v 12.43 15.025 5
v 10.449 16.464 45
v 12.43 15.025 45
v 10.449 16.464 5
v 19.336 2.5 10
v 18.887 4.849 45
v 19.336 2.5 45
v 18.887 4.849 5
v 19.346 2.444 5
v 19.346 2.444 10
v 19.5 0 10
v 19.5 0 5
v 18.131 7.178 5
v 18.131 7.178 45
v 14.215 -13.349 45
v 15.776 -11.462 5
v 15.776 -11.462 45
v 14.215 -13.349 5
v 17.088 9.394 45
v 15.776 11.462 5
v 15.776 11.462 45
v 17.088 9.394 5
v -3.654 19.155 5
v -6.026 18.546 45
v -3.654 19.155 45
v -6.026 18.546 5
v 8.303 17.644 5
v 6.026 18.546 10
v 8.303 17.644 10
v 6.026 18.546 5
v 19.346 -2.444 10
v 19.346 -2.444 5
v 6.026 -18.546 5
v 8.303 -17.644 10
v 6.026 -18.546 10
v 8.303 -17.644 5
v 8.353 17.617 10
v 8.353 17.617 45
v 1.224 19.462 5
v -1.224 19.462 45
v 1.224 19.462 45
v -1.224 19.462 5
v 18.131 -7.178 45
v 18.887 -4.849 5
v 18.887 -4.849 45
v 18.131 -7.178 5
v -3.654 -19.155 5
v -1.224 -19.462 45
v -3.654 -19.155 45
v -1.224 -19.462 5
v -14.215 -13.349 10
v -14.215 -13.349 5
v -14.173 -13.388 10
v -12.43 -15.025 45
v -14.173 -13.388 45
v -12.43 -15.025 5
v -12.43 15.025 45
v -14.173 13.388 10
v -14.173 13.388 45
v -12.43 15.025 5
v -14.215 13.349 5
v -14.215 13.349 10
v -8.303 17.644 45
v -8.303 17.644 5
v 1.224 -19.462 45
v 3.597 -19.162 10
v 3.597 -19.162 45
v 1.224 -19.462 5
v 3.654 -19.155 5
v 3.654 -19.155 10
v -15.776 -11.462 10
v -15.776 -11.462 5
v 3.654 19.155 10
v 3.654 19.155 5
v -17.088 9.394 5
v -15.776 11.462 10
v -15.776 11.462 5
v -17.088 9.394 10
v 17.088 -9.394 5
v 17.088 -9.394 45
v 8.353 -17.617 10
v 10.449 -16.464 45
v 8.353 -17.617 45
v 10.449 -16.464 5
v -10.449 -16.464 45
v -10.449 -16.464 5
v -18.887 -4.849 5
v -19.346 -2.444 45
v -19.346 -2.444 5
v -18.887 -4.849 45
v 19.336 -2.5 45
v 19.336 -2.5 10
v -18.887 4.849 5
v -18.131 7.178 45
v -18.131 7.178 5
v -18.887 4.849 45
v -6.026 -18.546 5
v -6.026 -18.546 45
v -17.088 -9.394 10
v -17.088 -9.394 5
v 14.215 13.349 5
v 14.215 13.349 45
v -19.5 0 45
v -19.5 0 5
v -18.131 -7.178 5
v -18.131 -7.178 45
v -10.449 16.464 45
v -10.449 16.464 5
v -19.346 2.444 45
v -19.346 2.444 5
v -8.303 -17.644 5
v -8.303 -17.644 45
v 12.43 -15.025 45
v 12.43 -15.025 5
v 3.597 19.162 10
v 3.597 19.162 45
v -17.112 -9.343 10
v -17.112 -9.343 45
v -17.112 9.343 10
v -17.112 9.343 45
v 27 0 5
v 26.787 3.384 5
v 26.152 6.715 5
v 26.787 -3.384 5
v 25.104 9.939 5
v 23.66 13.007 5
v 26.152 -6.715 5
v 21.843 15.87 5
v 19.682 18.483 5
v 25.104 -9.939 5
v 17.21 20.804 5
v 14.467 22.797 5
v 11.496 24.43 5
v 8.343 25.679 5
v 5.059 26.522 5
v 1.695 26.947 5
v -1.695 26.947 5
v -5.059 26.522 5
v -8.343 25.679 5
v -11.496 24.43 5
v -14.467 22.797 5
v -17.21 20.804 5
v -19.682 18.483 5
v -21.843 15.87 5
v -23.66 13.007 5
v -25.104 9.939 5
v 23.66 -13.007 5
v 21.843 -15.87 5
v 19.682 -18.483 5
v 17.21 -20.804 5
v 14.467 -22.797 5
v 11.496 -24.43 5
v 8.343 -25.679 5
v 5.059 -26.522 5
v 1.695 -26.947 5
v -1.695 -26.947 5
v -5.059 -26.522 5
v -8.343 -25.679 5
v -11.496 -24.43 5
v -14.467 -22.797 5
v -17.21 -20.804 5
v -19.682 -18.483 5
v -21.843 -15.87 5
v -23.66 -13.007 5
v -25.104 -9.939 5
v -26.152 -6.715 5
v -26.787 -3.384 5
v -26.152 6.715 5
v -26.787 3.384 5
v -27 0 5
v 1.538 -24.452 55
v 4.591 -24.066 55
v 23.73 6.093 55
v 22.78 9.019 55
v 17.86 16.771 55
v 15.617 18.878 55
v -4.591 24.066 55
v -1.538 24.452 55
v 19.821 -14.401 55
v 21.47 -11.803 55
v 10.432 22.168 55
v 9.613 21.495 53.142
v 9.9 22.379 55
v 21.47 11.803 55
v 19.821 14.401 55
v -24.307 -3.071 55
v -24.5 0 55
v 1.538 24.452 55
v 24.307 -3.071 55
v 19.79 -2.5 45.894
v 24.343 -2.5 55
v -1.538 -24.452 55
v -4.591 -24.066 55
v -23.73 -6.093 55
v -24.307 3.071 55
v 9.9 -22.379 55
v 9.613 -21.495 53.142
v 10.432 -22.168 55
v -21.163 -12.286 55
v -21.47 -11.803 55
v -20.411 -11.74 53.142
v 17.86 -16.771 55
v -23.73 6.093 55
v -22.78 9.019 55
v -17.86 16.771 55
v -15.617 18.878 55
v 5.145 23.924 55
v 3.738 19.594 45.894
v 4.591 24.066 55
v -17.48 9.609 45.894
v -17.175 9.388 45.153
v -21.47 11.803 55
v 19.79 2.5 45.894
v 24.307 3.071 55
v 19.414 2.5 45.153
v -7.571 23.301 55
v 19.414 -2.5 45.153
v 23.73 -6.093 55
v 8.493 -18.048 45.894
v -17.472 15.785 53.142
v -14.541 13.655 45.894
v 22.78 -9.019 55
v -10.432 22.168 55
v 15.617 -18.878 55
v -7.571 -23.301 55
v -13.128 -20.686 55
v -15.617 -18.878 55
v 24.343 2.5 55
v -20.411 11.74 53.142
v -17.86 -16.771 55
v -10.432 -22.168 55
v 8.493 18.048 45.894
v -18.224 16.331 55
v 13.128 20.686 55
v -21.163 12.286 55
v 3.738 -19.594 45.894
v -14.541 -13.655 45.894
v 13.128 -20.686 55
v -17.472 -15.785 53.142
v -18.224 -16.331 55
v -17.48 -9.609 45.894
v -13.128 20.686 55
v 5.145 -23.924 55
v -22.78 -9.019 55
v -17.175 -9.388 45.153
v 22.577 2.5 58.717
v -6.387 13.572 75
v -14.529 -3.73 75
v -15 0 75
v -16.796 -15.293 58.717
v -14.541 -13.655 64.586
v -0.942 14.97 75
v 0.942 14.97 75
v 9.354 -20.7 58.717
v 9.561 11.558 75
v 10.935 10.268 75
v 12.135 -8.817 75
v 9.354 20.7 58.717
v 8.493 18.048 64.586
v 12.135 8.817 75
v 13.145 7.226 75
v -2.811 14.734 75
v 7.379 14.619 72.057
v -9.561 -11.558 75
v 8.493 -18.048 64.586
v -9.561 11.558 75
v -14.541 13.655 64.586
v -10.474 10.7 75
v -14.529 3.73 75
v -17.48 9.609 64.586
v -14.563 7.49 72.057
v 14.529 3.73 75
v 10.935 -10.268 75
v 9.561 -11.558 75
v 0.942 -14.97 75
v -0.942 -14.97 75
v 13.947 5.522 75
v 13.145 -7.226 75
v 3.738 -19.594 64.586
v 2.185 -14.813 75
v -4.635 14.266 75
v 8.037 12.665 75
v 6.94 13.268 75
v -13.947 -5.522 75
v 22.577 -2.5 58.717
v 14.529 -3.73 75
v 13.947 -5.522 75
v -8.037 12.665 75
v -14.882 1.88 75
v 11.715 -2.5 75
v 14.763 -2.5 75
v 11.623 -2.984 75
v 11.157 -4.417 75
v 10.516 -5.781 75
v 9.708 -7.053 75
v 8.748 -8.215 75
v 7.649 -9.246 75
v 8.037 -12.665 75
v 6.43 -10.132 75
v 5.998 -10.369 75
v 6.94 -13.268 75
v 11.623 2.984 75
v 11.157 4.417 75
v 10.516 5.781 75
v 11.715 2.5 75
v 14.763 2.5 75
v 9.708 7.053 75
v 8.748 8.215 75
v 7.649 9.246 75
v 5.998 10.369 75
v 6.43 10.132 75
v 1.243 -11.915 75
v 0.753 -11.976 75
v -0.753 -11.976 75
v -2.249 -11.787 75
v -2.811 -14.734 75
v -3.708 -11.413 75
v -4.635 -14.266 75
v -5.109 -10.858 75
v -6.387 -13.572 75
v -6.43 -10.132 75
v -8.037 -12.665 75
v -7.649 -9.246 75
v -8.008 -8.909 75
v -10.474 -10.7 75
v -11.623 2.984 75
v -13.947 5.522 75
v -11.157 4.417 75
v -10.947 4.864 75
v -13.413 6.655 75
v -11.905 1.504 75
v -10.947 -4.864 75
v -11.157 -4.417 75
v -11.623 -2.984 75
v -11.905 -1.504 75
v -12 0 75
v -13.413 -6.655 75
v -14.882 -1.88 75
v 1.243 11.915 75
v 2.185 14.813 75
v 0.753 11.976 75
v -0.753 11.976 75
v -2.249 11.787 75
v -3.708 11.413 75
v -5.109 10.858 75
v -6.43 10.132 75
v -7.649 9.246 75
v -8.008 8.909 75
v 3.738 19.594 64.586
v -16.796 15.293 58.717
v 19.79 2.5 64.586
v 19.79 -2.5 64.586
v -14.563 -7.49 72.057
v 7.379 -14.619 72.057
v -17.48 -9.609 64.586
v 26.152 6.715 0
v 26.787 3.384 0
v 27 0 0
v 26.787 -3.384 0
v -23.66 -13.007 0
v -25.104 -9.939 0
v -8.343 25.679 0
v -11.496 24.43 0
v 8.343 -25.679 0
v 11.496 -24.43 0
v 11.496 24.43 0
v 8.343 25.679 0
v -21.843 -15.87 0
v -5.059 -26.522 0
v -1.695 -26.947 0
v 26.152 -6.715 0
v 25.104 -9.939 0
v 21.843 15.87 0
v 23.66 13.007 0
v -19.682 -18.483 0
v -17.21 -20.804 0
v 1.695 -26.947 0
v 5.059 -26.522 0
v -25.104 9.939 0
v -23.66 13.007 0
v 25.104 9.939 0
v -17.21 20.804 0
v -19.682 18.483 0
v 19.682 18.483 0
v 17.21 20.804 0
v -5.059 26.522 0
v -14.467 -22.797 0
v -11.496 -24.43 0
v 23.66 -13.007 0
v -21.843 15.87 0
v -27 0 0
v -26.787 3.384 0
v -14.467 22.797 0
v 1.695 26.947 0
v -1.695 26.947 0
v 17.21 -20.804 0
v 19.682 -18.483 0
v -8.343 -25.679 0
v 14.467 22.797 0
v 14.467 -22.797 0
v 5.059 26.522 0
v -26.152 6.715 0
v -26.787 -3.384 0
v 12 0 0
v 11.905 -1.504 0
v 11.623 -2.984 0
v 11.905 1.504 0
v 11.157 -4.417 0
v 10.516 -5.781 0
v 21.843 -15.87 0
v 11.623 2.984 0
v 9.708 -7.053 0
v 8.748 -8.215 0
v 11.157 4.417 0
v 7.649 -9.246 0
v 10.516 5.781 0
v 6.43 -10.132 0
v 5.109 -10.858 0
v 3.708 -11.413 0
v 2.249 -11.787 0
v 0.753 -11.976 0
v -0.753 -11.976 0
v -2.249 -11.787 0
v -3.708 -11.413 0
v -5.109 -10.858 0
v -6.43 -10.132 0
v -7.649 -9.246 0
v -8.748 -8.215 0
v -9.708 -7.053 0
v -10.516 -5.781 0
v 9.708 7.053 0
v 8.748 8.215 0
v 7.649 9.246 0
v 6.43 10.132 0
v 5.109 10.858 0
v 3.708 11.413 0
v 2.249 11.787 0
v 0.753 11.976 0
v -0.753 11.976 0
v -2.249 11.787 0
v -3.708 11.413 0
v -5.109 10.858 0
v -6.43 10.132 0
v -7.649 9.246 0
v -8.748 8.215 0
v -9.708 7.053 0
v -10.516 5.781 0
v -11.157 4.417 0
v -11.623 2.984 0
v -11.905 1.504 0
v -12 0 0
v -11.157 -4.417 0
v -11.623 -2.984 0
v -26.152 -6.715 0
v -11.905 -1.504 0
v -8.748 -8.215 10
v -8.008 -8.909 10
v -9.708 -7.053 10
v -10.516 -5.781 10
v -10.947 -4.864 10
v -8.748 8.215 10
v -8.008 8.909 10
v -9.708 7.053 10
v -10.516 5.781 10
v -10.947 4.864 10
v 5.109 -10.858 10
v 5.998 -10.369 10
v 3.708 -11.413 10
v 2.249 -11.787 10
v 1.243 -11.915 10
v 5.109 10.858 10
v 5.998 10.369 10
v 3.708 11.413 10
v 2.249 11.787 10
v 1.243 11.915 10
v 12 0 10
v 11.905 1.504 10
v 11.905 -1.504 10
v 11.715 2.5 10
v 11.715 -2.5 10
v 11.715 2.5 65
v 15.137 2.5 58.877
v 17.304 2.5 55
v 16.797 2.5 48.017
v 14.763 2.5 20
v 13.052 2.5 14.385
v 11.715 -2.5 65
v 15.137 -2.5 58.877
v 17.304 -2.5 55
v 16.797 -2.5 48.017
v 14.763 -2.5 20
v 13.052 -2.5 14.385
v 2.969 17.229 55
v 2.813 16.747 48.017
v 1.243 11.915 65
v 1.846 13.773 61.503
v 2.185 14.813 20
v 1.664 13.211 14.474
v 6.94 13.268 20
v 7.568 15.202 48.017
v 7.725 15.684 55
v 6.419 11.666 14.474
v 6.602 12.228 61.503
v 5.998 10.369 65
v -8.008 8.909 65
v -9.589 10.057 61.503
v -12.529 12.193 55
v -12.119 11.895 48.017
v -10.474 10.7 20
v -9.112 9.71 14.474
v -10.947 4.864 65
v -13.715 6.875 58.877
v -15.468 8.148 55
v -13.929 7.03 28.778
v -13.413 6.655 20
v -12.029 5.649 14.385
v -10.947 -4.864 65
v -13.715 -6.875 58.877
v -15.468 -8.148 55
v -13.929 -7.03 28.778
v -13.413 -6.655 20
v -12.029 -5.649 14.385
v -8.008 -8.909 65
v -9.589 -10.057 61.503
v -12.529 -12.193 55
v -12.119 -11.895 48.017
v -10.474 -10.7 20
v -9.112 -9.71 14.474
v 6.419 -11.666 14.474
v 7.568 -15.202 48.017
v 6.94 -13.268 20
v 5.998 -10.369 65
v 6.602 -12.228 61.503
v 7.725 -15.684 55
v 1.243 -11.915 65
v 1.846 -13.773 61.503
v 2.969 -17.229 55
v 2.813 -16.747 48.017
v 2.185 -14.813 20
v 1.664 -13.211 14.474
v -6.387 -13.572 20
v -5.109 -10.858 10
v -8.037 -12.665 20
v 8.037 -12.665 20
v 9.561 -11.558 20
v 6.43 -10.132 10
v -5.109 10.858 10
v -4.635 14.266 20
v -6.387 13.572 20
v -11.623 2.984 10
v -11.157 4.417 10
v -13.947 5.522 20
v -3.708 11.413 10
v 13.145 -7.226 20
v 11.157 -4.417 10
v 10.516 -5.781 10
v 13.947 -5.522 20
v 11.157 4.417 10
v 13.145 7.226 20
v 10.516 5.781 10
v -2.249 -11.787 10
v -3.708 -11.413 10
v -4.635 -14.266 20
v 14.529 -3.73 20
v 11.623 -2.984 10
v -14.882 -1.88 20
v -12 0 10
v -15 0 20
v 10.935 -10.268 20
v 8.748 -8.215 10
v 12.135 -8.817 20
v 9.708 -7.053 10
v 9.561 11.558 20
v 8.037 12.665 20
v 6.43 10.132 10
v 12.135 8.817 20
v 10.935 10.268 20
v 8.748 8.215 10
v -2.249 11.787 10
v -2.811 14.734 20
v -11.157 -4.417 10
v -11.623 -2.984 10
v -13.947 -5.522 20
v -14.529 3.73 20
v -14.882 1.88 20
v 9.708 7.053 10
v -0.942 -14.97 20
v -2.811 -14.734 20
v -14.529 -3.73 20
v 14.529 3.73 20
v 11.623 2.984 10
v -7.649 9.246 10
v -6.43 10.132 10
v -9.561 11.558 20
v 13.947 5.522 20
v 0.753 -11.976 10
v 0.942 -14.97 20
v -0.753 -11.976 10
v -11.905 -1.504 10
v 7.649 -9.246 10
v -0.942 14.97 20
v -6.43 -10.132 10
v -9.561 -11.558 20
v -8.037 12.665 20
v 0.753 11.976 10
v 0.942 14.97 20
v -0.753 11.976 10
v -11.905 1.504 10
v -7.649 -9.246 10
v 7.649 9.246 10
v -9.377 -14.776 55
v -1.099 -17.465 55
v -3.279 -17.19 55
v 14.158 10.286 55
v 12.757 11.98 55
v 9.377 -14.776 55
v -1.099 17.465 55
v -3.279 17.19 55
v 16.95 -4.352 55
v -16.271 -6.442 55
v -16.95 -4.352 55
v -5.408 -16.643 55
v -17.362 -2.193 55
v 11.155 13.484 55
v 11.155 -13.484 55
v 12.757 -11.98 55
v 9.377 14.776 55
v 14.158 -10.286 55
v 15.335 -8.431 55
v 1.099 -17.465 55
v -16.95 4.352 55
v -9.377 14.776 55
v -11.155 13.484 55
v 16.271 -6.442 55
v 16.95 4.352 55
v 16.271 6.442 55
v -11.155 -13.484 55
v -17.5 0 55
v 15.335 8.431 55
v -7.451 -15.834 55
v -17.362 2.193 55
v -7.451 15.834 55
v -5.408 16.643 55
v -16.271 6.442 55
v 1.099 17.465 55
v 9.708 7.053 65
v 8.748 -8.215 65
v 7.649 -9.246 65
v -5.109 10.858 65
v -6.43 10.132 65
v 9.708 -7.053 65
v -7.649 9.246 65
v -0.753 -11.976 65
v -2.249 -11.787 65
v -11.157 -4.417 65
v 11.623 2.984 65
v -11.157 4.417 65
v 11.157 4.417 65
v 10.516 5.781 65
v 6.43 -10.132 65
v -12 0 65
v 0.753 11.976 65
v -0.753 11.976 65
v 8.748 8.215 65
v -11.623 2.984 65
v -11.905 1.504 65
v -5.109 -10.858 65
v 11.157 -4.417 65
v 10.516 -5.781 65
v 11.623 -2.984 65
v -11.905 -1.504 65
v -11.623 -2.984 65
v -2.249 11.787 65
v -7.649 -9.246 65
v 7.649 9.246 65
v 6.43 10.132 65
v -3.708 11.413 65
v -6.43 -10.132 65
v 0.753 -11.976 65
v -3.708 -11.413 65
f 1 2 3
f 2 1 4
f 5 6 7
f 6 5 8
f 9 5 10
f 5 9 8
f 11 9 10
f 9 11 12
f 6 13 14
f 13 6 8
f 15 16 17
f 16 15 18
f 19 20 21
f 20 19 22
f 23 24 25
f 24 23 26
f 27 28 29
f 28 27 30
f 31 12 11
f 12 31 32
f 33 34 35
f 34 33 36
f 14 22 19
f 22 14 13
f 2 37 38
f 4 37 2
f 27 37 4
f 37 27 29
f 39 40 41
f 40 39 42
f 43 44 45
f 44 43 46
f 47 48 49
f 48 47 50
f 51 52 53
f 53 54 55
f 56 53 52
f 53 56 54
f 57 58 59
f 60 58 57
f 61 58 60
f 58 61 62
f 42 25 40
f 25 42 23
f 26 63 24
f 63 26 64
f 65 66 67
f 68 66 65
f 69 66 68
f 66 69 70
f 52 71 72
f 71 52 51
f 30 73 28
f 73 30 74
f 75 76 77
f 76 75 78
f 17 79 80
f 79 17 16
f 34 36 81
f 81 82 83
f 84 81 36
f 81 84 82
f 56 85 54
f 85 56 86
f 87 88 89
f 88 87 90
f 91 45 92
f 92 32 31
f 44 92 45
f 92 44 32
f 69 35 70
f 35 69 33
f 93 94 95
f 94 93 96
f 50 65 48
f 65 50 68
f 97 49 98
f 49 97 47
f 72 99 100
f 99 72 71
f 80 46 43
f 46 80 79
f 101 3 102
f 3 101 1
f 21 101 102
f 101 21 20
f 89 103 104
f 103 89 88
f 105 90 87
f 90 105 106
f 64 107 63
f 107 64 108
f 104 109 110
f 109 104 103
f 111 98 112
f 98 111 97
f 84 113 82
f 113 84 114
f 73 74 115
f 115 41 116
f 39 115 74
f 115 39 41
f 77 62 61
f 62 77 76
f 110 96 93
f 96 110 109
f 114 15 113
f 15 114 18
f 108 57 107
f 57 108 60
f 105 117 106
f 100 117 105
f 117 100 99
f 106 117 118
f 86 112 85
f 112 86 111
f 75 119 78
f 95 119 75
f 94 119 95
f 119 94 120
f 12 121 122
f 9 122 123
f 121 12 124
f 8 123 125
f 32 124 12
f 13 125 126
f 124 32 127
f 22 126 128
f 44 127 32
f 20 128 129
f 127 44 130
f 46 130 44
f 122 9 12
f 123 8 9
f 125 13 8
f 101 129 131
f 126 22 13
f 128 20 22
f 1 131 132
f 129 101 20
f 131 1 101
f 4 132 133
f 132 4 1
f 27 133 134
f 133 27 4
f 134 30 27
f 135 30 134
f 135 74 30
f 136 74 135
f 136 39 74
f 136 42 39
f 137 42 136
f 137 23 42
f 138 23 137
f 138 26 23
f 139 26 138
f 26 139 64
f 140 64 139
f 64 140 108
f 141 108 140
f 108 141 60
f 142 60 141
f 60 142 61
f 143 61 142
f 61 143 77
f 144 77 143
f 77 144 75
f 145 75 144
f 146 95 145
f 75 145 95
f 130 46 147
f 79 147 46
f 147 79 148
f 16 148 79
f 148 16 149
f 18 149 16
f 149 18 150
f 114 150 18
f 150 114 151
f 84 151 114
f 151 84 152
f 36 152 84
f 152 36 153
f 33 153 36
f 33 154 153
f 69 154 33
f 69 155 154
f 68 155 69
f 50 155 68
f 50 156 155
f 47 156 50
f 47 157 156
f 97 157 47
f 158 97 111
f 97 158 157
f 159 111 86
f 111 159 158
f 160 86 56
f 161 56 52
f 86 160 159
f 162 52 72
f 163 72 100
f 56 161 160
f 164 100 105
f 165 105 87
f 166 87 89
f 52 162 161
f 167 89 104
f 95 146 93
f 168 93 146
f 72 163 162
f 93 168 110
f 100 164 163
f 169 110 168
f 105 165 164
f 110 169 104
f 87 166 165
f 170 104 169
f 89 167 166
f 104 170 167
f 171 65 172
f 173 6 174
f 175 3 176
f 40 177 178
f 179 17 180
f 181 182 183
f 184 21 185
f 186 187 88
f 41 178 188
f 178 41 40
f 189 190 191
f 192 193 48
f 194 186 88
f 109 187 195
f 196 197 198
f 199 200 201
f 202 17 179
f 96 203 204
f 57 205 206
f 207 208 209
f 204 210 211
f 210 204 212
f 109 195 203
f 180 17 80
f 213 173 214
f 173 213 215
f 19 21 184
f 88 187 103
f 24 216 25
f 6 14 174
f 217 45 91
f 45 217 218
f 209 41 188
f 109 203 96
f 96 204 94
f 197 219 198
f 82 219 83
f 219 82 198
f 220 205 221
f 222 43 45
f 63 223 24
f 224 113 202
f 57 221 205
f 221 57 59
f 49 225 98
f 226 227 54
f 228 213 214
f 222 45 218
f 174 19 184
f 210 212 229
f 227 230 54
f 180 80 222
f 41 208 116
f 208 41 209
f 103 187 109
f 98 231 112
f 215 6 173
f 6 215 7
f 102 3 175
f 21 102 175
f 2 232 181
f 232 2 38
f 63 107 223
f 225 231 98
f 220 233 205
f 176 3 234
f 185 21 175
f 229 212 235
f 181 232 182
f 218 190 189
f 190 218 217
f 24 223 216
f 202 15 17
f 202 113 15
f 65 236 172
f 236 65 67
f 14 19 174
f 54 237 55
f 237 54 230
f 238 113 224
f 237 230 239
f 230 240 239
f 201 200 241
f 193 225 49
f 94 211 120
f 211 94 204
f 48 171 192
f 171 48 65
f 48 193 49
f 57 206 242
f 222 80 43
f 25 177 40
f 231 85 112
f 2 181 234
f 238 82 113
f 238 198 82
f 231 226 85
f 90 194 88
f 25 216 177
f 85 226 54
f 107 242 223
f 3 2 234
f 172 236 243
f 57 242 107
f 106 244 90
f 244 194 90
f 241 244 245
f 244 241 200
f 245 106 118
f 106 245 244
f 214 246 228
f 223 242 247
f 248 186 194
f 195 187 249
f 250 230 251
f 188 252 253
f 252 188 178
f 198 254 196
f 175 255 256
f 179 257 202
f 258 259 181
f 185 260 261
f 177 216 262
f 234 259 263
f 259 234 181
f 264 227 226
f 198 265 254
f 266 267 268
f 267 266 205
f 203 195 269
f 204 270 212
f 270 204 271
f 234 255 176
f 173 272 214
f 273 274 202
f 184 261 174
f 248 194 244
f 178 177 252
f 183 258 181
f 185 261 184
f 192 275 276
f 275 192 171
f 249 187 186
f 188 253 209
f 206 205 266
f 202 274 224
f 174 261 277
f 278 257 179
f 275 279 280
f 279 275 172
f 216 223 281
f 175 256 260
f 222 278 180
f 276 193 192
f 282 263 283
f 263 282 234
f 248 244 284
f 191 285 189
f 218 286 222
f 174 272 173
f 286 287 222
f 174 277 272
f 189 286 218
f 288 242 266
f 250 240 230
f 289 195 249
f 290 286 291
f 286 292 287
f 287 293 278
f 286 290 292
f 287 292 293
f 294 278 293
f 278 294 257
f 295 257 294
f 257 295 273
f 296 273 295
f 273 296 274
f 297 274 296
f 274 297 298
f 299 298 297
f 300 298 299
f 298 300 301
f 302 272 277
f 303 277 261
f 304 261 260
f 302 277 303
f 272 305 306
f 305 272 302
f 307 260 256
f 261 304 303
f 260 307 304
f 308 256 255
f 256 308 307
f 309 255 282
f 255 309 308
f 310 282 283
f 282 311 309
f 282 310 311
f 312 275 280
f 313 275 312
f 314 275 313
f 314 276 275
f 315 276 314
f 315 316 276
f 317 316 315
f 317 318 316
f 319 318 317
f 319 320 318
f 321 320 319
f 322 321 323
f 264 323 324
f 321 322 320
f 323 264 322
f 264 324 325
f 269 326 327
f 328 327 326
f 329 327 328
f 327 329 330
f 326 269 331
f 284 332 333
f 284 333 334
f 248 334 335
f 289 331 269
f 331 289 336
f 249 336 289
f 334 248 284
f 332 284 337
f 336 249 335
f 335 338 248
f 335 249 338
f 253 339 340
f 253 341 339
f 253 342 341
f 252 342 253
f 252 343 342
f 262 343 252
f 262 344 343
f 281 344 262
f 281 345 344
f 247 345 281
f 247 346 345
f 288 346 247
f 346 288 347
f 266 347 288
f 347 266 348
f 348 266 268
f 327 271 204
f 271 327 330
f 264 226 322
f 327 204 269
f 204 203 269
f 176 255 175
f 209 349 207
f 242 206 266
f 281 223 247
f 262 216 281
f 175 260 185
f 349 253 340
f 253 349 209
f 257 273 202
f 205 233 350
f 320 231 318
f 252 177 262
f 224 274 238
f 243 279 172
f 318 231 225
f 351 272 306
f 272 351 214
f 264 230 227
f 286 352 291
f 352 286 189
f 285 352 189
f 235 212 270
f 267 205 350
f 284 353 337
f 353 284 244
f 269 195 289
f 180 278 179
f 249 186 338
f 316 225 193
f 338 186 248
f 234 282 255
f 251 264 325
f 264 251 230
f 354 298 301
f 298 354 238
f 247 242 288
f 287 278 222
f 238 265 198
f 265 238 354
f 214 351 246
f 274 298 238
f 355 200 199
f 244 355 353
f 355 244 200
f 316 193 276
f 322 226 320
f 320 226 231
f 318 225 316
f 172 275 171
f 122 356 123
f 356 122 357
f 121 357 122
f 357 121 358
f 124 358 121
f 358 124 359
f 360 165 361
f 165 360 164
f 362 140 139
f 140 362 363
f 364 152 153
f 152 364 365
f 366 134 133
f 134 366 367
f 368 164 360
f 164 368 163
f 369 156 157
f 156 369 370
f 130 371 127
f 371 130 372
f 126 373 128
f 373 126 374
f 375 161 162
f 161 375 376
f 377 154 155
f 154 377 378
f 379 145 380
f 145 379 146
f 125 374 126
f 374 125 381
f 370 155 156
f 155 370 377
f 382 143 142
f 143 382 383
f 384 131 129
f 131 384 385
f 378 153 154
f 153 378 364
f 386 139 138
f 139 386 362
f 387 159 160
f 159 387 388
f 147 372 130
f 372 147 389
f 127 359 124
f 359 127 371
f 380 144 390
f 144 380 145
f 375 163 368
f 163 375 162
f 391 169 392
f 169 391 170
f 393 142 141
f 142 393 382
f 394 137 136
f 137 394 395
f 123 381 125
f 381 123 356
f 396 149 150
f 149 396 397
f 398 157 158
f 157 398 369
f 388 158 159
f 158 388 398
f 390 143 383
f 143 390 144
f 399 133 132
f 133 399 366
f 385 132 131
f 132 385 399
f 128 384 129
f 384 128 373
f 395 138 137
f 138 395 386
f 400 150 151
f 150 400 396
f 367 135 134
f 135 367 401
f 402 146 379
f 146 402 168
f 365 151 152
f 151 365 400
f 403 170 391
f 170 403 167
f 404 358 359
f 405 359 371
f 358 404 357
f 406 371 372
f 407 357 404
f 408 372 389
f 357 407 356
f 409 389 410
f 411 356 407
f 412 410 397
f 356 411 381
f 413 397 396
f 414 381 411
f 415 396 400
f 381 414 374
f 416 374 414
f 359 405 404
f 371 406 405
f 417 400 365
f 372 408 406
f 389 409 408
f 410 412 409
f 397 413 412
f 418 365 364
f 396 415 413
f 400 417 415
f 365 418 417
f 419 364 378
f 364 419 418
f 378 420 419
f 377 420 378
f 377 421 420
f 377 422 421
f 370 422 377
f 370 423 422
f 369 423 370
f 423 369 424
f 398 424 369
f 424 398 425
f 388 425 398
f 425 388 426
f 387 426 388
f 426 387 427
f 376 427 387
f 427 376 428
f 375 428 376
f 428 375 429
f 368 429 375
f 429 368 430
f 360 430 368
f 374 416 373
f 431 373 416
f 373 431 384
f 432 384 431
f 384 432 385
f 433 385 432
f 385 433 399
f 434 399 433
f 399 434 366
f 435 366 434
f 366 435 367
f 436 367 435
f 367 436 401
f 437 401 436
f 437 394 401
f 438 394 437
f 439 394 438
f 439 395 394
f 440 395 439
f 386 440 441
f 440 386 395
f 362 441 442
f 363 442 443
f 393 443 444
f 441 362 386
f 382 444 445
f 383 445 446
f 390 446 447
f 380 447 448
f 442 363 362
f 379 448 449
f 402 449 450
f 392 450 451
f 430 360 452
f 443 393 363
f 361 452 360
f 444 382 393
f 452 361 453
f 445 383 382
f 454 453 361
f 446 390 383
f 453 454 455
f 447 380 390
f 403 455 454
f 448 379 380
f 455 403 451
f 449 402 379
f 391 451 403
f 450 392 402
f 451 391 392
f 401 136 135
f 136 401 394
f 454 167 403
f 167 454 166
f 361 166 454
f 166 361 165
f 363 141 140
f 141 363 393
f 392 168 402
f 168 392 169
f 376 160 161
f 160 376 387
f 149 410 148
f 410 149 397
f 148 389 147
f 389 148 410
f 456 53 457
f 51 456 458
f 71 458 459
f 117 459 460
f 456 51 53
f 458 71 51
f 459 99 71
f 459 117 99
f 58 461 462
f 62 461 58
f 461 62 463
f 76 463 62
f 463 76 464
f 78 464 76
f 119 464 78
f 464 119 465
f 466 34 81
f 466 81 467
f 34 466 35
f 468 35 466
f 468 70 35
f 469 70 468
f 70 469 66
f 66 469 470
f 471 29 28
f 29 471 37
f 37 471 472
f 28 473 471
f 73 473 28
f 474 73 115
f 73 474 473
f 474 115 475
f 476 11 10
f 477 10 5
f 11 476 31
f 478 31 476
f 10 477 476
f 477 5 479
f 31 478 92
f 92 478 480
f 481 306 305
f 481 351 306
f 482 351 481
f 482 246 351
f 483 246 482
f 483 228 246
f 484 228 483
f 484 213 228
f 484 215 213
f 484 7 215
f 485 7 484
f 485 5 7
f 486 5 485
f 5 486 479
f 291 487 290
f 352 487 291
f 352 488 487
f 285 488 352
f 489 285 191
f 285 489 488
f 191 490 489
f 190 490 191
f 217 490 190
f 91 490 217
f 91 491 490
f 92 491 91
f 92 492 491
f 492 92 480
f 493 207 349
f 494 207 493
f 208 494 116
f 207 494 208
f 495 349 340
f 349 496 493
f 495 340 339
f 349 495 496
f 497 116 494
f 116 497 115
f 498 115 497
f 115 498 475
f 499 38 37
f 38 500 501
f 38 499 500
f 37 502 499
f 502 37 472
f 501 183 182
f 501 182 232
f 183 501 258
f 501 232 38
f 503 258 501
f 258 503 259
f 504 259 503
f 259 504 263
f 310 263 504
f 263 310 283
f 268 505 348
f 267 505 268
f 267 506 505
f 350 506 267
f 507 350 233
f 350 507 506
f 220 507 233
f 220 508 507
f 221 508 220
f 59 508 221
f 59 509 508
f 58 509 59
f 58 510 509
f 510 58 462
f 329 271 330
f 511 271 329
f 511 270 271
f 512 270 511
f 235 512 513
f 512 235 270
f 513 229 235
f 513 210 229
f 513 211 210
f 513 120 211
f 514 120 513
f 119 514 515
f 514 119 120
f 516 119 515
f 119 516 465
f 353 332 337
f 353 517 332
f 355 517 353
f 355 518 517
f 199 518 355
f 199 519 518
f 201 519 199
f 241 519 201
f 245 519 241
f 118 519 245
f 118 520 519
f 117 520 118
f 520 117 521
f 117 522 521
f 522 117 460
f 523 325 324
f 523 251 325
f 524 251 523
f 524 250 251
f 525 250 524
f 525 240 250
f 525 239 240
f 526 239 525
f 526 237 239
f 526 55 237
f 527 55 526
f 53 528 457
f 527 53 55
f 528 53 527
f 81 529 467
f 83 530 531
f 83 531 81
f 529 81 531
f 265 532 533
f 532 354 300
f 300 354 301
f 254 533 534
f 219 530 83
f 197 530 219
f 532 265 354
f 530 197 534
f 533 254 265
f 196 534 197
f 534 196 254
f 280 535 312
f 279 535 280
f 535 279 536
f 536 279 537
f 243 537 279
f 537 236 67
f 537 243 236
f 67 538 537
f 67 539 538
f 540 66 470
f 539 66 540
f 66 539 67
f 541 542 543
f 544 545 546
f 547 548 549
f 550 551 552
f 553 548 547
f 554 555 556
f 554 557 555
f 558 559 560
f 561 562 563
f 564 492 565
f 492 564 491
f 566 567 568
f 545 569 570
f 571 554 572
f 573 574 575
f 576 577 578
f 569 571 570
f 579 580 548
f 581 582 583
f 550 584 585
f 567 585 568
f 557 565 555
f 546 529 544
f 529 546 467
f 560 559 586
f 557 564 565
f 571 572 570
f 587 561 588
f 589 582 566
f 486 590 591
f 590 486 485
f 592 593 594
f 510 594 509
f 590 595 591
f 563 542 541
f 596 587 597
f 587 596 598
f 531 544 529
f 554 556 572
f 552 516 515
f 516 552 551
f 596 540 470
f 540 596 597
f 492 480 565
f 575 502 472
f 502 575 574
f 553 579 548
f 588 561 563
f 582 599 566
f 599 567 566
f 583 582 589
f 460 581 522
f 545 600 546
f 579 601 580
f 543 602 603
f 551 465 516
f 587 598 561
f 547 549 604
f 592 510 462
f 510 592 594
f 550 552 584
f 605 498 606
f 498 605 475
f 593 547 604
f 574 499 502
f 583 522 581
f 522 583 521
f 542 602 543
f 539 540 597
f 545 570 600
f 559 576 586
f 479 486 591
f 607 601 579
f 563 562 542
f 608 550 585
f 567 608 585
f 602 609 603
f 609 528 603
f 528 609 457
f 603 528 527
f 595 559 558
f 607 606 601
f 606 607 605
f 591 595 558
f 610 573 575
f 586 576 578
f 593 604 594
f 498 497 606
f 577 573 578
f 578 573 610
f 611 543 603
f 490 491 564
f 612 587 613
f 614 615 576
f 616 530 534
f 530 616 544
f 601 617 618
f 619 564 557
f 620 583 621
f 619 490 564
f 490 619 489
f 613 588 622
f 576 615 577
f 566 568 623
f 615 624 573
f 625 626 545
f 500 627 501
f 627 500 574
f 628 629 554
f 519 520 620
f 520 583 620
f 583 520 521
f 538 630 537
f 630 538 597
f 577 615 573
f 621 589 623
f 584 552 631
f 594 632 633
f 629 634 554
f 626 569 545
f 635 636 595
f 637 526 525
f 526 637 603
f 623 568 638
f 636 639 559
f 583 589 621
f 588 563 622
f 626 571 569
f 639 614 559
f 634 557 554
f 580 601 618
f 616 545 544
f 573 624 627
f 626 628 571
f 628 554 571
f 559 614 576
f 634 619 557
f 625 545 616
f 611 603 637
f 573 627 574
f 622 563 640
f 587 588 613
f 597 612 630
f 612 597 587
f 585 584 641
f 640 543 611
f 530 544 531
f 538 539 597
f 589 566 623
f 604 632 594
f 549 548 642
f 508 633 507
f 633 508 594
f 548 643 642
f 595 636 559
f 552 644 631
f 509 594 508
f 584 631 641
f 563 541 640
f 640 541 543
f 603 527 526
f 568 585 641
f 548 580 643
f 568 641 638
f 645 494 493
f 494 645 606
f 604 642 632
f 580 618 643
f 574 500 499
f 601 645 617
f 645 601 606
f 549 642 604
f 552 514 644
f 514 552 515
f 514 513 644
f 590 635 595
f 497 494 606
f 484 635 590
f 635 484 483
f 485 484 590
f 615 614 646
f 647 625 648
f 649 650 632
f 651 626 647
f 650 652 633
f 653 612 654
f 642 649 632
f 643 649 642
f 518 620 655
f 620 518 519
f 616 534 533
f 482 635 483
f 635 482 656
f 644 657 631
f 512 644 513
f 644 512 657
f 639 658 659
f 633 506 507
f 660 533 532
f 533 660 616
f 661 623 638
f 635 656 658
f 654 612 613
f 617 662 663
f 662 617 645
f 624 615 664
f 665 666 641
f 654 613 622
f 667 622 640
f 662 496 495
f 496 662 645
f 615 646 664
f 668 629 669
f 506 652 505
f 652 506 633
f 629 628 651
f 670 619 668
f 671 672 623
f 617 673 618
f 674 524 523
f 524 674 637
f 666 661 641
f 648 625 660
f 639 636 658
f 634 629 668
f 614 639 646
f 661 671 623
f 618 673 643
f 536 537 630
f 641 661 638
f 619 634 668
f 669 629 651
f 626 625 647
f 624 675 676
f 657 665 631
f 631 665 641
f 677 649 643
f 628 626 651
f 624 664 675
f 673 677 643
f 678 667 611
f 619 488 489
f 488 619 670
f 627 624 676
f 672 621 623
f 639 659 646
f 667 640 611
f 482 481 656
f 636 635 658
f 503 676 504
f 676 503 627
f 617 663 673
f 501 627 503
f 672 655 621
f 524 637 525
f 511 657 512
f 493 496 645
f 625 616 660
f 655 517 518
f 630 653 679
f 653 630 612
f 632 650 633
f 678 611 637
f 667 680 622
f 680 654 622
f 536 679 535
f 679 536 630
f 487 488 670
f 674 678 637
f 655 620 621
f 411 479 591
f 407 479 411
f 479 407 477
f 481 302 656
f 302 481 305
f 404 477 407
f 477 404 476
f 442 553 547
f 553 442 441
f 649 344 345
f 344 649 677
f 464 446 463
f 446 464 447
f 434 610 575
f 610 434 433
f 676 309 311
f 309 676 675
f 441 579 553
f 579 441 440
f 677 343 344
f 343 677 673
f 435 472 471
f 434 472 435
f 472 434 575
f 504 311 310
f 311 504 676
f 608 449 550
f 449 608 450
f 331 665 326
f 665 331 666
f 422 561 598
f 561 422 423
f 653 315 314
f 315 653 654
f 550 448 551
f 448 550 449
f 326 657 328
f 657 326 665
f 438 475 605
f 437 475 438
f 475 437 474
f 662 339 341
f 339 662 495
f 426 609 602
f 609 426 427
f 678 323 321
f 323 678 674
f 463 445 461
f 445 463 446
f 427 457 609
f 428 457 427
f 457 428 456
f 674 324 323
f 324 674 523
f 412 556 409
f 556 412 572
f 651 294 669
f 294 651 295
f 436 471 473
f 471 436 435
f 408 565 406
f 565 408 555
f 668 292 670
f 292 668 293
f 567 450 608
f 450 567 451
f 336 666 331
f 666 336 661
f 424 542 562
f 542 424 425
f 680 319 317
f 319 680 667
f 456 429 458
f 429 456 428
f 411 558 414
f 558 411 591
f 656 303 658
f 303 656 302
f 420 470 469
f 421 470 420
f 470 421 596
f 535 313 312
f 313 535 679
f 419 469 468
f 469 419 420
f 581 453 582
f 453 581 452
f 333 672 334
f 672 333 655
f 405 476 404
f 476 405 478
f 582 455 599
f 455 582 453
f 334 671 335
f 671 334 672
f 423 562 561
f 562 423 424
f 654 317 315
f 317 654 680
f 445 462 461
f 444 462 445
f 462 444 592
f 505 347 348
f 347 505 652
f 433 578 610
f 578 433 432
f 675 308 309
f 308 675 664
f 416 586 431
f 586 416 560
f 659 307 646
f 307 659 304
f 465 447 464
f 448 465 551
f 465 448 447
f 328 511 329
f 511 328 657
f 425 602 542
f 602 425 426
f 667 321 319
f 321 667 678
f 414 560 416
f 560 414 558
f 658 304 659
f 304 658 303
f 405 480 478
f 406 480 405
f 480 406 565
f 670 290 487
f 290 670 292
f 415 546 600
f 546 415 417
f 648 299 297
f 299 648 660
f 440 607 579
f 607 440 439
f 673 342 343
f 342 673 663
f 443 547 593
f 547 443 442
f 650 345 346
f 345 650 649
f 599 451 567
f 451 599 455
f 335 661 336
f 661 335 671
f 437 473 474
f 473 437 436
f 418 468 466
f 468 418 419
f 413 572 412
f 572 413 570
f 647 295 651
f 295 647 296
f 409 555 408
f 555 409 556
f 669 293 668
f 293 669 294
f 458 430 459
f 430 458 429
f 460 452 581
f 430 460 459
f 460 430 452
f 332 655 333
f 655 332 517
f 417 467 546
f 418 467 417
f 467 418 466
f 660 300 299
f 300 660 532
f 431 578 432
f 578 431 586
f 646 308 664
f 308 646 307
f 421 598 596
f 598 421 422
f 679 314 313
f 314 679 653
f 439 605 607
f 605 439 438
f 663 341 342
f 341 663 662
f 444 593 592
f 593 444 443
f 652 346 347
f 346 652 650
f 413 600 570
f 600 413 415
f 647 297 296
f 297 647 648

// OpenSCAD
/*
 * Tube adapter
 * (c) 2018 Greizgh
 * License: CC-BY-SA
 */

// Geometry resolution
$fn=50;

/* [Outer shape] */
// Length of first section in mm
l1=40;
// First diameter in mm
d1=39;
// Second diameter in mm
d2=39;
// Length of second section in mm
l2=10;
// Third diameter in mm
d3=49;
// Length of final section in mm
l3=20;
// Final diameter in mm
d4=30; 

/* [Inner shape] */
// Inner diameter in mm
inner_diameter=24;
// Inner recess: length of the first section in mm
recess_l1=10; 
// Inner recess: max diameter of the first section in mm
recess_d1=30;
// Inner recess: length of the second section in mm
recess_l2=35;
// Inner recess: diameter of the second section in mm
recess_d2=35;
// Length of the final section in mm
recess_l3=10;
// Recess start, relative to the collar in mm
recess_offset=5;

/* [Slots] */
// width of a slot in mm
slot_width=5;
// Number of slots
slot_count=5;
// Start of the slot, relative to the collar in mm
slot_offset=5;

/* [Collar] */
// External diameter of the collar in mm
collar_diameter=54;
// Collar height in mm
collar_height=5;

// Tube adapter
module adapter(
    // External shape parameters
    l1=40, // Length of first section
    d1=39, // First diameter
    d2=39, // Second diameter
    l2=10, // Length of second section
    d3=40,
    l3=20, // Length of final section
    d4=30,
    // Inner shape parameters
    innerD=23, // Inner diameter
    // Inner recess
    il1=10, // Length of the first section
    id1=28, // max diameter of the first section
    il2=35, // Length of the second section
    id2=28,
    il3=10, // Length of the final section
    recessOffset=5, // Recess start, relative to the collar
    // slots
    slotW=5, // Slot width
    slotN=5, // Slot number
    slotOffset=5, // Start of the slot, relative to the collar
    // Collar
    collarD=54, // External diameter of the collar
    collarH=5 // Height of the collar
    ) {
  difference() {
    union() {
      cylinder(h=collarH, d=collarD);
      translate([0, 0, collarH]) {
          cylinder(h=l1, d1=d1, d2=d2);
          translate([0, 0, l1]) cylinder(h=l2, d1=d2, d2=d3);
          translate([0, 0, l1+l2]) cylinder(h=l3, d1=d3, d2=d4);
      };
    }
    cylinder(h=2*(l1+l2+l3+collarH+2), d=innerD, center=true);
    for (i = [0:slotN-1]) {
        rotate([0, 0, i*360/slotN]) translate([0, -slotW/2, collarH+slotOffset]) cube(size=[max(d1, d2, d3, d4), slotW, l1+l2+l3+2]);
    }
    // Inside 
    union() {
        translate([0, 0, collarH+recessOffset]) cylinder(h=il1, d1=innerD, d2=id1);
        translate([0, 0, collarH+recessOffset+il1]) cylinder(h=il2, d1=id1, d2=id2);
        translate([0, 0, collarH+recessOffset+il1+il2]) cylinder(h=il3, d1=id2, d2=innerD);
    }
  };
}




adapter(
l1=l1,
d1=d1,
d2=d2,
l2=l2,
d3=d3,
l3=l3,
d4=d4,
innerD=inner_diameter,
il1=recess_l1,
il2=recess_l2,
id1=recess_d1,
id2=recess_d2,
il3=recess_l3,
recessOffset=recess_offset,
slotW=slot_width,
slotN=slot_count,
slotOffset=slot_offset,
collarD=collar_diameter,
collarH=collar_height
);
